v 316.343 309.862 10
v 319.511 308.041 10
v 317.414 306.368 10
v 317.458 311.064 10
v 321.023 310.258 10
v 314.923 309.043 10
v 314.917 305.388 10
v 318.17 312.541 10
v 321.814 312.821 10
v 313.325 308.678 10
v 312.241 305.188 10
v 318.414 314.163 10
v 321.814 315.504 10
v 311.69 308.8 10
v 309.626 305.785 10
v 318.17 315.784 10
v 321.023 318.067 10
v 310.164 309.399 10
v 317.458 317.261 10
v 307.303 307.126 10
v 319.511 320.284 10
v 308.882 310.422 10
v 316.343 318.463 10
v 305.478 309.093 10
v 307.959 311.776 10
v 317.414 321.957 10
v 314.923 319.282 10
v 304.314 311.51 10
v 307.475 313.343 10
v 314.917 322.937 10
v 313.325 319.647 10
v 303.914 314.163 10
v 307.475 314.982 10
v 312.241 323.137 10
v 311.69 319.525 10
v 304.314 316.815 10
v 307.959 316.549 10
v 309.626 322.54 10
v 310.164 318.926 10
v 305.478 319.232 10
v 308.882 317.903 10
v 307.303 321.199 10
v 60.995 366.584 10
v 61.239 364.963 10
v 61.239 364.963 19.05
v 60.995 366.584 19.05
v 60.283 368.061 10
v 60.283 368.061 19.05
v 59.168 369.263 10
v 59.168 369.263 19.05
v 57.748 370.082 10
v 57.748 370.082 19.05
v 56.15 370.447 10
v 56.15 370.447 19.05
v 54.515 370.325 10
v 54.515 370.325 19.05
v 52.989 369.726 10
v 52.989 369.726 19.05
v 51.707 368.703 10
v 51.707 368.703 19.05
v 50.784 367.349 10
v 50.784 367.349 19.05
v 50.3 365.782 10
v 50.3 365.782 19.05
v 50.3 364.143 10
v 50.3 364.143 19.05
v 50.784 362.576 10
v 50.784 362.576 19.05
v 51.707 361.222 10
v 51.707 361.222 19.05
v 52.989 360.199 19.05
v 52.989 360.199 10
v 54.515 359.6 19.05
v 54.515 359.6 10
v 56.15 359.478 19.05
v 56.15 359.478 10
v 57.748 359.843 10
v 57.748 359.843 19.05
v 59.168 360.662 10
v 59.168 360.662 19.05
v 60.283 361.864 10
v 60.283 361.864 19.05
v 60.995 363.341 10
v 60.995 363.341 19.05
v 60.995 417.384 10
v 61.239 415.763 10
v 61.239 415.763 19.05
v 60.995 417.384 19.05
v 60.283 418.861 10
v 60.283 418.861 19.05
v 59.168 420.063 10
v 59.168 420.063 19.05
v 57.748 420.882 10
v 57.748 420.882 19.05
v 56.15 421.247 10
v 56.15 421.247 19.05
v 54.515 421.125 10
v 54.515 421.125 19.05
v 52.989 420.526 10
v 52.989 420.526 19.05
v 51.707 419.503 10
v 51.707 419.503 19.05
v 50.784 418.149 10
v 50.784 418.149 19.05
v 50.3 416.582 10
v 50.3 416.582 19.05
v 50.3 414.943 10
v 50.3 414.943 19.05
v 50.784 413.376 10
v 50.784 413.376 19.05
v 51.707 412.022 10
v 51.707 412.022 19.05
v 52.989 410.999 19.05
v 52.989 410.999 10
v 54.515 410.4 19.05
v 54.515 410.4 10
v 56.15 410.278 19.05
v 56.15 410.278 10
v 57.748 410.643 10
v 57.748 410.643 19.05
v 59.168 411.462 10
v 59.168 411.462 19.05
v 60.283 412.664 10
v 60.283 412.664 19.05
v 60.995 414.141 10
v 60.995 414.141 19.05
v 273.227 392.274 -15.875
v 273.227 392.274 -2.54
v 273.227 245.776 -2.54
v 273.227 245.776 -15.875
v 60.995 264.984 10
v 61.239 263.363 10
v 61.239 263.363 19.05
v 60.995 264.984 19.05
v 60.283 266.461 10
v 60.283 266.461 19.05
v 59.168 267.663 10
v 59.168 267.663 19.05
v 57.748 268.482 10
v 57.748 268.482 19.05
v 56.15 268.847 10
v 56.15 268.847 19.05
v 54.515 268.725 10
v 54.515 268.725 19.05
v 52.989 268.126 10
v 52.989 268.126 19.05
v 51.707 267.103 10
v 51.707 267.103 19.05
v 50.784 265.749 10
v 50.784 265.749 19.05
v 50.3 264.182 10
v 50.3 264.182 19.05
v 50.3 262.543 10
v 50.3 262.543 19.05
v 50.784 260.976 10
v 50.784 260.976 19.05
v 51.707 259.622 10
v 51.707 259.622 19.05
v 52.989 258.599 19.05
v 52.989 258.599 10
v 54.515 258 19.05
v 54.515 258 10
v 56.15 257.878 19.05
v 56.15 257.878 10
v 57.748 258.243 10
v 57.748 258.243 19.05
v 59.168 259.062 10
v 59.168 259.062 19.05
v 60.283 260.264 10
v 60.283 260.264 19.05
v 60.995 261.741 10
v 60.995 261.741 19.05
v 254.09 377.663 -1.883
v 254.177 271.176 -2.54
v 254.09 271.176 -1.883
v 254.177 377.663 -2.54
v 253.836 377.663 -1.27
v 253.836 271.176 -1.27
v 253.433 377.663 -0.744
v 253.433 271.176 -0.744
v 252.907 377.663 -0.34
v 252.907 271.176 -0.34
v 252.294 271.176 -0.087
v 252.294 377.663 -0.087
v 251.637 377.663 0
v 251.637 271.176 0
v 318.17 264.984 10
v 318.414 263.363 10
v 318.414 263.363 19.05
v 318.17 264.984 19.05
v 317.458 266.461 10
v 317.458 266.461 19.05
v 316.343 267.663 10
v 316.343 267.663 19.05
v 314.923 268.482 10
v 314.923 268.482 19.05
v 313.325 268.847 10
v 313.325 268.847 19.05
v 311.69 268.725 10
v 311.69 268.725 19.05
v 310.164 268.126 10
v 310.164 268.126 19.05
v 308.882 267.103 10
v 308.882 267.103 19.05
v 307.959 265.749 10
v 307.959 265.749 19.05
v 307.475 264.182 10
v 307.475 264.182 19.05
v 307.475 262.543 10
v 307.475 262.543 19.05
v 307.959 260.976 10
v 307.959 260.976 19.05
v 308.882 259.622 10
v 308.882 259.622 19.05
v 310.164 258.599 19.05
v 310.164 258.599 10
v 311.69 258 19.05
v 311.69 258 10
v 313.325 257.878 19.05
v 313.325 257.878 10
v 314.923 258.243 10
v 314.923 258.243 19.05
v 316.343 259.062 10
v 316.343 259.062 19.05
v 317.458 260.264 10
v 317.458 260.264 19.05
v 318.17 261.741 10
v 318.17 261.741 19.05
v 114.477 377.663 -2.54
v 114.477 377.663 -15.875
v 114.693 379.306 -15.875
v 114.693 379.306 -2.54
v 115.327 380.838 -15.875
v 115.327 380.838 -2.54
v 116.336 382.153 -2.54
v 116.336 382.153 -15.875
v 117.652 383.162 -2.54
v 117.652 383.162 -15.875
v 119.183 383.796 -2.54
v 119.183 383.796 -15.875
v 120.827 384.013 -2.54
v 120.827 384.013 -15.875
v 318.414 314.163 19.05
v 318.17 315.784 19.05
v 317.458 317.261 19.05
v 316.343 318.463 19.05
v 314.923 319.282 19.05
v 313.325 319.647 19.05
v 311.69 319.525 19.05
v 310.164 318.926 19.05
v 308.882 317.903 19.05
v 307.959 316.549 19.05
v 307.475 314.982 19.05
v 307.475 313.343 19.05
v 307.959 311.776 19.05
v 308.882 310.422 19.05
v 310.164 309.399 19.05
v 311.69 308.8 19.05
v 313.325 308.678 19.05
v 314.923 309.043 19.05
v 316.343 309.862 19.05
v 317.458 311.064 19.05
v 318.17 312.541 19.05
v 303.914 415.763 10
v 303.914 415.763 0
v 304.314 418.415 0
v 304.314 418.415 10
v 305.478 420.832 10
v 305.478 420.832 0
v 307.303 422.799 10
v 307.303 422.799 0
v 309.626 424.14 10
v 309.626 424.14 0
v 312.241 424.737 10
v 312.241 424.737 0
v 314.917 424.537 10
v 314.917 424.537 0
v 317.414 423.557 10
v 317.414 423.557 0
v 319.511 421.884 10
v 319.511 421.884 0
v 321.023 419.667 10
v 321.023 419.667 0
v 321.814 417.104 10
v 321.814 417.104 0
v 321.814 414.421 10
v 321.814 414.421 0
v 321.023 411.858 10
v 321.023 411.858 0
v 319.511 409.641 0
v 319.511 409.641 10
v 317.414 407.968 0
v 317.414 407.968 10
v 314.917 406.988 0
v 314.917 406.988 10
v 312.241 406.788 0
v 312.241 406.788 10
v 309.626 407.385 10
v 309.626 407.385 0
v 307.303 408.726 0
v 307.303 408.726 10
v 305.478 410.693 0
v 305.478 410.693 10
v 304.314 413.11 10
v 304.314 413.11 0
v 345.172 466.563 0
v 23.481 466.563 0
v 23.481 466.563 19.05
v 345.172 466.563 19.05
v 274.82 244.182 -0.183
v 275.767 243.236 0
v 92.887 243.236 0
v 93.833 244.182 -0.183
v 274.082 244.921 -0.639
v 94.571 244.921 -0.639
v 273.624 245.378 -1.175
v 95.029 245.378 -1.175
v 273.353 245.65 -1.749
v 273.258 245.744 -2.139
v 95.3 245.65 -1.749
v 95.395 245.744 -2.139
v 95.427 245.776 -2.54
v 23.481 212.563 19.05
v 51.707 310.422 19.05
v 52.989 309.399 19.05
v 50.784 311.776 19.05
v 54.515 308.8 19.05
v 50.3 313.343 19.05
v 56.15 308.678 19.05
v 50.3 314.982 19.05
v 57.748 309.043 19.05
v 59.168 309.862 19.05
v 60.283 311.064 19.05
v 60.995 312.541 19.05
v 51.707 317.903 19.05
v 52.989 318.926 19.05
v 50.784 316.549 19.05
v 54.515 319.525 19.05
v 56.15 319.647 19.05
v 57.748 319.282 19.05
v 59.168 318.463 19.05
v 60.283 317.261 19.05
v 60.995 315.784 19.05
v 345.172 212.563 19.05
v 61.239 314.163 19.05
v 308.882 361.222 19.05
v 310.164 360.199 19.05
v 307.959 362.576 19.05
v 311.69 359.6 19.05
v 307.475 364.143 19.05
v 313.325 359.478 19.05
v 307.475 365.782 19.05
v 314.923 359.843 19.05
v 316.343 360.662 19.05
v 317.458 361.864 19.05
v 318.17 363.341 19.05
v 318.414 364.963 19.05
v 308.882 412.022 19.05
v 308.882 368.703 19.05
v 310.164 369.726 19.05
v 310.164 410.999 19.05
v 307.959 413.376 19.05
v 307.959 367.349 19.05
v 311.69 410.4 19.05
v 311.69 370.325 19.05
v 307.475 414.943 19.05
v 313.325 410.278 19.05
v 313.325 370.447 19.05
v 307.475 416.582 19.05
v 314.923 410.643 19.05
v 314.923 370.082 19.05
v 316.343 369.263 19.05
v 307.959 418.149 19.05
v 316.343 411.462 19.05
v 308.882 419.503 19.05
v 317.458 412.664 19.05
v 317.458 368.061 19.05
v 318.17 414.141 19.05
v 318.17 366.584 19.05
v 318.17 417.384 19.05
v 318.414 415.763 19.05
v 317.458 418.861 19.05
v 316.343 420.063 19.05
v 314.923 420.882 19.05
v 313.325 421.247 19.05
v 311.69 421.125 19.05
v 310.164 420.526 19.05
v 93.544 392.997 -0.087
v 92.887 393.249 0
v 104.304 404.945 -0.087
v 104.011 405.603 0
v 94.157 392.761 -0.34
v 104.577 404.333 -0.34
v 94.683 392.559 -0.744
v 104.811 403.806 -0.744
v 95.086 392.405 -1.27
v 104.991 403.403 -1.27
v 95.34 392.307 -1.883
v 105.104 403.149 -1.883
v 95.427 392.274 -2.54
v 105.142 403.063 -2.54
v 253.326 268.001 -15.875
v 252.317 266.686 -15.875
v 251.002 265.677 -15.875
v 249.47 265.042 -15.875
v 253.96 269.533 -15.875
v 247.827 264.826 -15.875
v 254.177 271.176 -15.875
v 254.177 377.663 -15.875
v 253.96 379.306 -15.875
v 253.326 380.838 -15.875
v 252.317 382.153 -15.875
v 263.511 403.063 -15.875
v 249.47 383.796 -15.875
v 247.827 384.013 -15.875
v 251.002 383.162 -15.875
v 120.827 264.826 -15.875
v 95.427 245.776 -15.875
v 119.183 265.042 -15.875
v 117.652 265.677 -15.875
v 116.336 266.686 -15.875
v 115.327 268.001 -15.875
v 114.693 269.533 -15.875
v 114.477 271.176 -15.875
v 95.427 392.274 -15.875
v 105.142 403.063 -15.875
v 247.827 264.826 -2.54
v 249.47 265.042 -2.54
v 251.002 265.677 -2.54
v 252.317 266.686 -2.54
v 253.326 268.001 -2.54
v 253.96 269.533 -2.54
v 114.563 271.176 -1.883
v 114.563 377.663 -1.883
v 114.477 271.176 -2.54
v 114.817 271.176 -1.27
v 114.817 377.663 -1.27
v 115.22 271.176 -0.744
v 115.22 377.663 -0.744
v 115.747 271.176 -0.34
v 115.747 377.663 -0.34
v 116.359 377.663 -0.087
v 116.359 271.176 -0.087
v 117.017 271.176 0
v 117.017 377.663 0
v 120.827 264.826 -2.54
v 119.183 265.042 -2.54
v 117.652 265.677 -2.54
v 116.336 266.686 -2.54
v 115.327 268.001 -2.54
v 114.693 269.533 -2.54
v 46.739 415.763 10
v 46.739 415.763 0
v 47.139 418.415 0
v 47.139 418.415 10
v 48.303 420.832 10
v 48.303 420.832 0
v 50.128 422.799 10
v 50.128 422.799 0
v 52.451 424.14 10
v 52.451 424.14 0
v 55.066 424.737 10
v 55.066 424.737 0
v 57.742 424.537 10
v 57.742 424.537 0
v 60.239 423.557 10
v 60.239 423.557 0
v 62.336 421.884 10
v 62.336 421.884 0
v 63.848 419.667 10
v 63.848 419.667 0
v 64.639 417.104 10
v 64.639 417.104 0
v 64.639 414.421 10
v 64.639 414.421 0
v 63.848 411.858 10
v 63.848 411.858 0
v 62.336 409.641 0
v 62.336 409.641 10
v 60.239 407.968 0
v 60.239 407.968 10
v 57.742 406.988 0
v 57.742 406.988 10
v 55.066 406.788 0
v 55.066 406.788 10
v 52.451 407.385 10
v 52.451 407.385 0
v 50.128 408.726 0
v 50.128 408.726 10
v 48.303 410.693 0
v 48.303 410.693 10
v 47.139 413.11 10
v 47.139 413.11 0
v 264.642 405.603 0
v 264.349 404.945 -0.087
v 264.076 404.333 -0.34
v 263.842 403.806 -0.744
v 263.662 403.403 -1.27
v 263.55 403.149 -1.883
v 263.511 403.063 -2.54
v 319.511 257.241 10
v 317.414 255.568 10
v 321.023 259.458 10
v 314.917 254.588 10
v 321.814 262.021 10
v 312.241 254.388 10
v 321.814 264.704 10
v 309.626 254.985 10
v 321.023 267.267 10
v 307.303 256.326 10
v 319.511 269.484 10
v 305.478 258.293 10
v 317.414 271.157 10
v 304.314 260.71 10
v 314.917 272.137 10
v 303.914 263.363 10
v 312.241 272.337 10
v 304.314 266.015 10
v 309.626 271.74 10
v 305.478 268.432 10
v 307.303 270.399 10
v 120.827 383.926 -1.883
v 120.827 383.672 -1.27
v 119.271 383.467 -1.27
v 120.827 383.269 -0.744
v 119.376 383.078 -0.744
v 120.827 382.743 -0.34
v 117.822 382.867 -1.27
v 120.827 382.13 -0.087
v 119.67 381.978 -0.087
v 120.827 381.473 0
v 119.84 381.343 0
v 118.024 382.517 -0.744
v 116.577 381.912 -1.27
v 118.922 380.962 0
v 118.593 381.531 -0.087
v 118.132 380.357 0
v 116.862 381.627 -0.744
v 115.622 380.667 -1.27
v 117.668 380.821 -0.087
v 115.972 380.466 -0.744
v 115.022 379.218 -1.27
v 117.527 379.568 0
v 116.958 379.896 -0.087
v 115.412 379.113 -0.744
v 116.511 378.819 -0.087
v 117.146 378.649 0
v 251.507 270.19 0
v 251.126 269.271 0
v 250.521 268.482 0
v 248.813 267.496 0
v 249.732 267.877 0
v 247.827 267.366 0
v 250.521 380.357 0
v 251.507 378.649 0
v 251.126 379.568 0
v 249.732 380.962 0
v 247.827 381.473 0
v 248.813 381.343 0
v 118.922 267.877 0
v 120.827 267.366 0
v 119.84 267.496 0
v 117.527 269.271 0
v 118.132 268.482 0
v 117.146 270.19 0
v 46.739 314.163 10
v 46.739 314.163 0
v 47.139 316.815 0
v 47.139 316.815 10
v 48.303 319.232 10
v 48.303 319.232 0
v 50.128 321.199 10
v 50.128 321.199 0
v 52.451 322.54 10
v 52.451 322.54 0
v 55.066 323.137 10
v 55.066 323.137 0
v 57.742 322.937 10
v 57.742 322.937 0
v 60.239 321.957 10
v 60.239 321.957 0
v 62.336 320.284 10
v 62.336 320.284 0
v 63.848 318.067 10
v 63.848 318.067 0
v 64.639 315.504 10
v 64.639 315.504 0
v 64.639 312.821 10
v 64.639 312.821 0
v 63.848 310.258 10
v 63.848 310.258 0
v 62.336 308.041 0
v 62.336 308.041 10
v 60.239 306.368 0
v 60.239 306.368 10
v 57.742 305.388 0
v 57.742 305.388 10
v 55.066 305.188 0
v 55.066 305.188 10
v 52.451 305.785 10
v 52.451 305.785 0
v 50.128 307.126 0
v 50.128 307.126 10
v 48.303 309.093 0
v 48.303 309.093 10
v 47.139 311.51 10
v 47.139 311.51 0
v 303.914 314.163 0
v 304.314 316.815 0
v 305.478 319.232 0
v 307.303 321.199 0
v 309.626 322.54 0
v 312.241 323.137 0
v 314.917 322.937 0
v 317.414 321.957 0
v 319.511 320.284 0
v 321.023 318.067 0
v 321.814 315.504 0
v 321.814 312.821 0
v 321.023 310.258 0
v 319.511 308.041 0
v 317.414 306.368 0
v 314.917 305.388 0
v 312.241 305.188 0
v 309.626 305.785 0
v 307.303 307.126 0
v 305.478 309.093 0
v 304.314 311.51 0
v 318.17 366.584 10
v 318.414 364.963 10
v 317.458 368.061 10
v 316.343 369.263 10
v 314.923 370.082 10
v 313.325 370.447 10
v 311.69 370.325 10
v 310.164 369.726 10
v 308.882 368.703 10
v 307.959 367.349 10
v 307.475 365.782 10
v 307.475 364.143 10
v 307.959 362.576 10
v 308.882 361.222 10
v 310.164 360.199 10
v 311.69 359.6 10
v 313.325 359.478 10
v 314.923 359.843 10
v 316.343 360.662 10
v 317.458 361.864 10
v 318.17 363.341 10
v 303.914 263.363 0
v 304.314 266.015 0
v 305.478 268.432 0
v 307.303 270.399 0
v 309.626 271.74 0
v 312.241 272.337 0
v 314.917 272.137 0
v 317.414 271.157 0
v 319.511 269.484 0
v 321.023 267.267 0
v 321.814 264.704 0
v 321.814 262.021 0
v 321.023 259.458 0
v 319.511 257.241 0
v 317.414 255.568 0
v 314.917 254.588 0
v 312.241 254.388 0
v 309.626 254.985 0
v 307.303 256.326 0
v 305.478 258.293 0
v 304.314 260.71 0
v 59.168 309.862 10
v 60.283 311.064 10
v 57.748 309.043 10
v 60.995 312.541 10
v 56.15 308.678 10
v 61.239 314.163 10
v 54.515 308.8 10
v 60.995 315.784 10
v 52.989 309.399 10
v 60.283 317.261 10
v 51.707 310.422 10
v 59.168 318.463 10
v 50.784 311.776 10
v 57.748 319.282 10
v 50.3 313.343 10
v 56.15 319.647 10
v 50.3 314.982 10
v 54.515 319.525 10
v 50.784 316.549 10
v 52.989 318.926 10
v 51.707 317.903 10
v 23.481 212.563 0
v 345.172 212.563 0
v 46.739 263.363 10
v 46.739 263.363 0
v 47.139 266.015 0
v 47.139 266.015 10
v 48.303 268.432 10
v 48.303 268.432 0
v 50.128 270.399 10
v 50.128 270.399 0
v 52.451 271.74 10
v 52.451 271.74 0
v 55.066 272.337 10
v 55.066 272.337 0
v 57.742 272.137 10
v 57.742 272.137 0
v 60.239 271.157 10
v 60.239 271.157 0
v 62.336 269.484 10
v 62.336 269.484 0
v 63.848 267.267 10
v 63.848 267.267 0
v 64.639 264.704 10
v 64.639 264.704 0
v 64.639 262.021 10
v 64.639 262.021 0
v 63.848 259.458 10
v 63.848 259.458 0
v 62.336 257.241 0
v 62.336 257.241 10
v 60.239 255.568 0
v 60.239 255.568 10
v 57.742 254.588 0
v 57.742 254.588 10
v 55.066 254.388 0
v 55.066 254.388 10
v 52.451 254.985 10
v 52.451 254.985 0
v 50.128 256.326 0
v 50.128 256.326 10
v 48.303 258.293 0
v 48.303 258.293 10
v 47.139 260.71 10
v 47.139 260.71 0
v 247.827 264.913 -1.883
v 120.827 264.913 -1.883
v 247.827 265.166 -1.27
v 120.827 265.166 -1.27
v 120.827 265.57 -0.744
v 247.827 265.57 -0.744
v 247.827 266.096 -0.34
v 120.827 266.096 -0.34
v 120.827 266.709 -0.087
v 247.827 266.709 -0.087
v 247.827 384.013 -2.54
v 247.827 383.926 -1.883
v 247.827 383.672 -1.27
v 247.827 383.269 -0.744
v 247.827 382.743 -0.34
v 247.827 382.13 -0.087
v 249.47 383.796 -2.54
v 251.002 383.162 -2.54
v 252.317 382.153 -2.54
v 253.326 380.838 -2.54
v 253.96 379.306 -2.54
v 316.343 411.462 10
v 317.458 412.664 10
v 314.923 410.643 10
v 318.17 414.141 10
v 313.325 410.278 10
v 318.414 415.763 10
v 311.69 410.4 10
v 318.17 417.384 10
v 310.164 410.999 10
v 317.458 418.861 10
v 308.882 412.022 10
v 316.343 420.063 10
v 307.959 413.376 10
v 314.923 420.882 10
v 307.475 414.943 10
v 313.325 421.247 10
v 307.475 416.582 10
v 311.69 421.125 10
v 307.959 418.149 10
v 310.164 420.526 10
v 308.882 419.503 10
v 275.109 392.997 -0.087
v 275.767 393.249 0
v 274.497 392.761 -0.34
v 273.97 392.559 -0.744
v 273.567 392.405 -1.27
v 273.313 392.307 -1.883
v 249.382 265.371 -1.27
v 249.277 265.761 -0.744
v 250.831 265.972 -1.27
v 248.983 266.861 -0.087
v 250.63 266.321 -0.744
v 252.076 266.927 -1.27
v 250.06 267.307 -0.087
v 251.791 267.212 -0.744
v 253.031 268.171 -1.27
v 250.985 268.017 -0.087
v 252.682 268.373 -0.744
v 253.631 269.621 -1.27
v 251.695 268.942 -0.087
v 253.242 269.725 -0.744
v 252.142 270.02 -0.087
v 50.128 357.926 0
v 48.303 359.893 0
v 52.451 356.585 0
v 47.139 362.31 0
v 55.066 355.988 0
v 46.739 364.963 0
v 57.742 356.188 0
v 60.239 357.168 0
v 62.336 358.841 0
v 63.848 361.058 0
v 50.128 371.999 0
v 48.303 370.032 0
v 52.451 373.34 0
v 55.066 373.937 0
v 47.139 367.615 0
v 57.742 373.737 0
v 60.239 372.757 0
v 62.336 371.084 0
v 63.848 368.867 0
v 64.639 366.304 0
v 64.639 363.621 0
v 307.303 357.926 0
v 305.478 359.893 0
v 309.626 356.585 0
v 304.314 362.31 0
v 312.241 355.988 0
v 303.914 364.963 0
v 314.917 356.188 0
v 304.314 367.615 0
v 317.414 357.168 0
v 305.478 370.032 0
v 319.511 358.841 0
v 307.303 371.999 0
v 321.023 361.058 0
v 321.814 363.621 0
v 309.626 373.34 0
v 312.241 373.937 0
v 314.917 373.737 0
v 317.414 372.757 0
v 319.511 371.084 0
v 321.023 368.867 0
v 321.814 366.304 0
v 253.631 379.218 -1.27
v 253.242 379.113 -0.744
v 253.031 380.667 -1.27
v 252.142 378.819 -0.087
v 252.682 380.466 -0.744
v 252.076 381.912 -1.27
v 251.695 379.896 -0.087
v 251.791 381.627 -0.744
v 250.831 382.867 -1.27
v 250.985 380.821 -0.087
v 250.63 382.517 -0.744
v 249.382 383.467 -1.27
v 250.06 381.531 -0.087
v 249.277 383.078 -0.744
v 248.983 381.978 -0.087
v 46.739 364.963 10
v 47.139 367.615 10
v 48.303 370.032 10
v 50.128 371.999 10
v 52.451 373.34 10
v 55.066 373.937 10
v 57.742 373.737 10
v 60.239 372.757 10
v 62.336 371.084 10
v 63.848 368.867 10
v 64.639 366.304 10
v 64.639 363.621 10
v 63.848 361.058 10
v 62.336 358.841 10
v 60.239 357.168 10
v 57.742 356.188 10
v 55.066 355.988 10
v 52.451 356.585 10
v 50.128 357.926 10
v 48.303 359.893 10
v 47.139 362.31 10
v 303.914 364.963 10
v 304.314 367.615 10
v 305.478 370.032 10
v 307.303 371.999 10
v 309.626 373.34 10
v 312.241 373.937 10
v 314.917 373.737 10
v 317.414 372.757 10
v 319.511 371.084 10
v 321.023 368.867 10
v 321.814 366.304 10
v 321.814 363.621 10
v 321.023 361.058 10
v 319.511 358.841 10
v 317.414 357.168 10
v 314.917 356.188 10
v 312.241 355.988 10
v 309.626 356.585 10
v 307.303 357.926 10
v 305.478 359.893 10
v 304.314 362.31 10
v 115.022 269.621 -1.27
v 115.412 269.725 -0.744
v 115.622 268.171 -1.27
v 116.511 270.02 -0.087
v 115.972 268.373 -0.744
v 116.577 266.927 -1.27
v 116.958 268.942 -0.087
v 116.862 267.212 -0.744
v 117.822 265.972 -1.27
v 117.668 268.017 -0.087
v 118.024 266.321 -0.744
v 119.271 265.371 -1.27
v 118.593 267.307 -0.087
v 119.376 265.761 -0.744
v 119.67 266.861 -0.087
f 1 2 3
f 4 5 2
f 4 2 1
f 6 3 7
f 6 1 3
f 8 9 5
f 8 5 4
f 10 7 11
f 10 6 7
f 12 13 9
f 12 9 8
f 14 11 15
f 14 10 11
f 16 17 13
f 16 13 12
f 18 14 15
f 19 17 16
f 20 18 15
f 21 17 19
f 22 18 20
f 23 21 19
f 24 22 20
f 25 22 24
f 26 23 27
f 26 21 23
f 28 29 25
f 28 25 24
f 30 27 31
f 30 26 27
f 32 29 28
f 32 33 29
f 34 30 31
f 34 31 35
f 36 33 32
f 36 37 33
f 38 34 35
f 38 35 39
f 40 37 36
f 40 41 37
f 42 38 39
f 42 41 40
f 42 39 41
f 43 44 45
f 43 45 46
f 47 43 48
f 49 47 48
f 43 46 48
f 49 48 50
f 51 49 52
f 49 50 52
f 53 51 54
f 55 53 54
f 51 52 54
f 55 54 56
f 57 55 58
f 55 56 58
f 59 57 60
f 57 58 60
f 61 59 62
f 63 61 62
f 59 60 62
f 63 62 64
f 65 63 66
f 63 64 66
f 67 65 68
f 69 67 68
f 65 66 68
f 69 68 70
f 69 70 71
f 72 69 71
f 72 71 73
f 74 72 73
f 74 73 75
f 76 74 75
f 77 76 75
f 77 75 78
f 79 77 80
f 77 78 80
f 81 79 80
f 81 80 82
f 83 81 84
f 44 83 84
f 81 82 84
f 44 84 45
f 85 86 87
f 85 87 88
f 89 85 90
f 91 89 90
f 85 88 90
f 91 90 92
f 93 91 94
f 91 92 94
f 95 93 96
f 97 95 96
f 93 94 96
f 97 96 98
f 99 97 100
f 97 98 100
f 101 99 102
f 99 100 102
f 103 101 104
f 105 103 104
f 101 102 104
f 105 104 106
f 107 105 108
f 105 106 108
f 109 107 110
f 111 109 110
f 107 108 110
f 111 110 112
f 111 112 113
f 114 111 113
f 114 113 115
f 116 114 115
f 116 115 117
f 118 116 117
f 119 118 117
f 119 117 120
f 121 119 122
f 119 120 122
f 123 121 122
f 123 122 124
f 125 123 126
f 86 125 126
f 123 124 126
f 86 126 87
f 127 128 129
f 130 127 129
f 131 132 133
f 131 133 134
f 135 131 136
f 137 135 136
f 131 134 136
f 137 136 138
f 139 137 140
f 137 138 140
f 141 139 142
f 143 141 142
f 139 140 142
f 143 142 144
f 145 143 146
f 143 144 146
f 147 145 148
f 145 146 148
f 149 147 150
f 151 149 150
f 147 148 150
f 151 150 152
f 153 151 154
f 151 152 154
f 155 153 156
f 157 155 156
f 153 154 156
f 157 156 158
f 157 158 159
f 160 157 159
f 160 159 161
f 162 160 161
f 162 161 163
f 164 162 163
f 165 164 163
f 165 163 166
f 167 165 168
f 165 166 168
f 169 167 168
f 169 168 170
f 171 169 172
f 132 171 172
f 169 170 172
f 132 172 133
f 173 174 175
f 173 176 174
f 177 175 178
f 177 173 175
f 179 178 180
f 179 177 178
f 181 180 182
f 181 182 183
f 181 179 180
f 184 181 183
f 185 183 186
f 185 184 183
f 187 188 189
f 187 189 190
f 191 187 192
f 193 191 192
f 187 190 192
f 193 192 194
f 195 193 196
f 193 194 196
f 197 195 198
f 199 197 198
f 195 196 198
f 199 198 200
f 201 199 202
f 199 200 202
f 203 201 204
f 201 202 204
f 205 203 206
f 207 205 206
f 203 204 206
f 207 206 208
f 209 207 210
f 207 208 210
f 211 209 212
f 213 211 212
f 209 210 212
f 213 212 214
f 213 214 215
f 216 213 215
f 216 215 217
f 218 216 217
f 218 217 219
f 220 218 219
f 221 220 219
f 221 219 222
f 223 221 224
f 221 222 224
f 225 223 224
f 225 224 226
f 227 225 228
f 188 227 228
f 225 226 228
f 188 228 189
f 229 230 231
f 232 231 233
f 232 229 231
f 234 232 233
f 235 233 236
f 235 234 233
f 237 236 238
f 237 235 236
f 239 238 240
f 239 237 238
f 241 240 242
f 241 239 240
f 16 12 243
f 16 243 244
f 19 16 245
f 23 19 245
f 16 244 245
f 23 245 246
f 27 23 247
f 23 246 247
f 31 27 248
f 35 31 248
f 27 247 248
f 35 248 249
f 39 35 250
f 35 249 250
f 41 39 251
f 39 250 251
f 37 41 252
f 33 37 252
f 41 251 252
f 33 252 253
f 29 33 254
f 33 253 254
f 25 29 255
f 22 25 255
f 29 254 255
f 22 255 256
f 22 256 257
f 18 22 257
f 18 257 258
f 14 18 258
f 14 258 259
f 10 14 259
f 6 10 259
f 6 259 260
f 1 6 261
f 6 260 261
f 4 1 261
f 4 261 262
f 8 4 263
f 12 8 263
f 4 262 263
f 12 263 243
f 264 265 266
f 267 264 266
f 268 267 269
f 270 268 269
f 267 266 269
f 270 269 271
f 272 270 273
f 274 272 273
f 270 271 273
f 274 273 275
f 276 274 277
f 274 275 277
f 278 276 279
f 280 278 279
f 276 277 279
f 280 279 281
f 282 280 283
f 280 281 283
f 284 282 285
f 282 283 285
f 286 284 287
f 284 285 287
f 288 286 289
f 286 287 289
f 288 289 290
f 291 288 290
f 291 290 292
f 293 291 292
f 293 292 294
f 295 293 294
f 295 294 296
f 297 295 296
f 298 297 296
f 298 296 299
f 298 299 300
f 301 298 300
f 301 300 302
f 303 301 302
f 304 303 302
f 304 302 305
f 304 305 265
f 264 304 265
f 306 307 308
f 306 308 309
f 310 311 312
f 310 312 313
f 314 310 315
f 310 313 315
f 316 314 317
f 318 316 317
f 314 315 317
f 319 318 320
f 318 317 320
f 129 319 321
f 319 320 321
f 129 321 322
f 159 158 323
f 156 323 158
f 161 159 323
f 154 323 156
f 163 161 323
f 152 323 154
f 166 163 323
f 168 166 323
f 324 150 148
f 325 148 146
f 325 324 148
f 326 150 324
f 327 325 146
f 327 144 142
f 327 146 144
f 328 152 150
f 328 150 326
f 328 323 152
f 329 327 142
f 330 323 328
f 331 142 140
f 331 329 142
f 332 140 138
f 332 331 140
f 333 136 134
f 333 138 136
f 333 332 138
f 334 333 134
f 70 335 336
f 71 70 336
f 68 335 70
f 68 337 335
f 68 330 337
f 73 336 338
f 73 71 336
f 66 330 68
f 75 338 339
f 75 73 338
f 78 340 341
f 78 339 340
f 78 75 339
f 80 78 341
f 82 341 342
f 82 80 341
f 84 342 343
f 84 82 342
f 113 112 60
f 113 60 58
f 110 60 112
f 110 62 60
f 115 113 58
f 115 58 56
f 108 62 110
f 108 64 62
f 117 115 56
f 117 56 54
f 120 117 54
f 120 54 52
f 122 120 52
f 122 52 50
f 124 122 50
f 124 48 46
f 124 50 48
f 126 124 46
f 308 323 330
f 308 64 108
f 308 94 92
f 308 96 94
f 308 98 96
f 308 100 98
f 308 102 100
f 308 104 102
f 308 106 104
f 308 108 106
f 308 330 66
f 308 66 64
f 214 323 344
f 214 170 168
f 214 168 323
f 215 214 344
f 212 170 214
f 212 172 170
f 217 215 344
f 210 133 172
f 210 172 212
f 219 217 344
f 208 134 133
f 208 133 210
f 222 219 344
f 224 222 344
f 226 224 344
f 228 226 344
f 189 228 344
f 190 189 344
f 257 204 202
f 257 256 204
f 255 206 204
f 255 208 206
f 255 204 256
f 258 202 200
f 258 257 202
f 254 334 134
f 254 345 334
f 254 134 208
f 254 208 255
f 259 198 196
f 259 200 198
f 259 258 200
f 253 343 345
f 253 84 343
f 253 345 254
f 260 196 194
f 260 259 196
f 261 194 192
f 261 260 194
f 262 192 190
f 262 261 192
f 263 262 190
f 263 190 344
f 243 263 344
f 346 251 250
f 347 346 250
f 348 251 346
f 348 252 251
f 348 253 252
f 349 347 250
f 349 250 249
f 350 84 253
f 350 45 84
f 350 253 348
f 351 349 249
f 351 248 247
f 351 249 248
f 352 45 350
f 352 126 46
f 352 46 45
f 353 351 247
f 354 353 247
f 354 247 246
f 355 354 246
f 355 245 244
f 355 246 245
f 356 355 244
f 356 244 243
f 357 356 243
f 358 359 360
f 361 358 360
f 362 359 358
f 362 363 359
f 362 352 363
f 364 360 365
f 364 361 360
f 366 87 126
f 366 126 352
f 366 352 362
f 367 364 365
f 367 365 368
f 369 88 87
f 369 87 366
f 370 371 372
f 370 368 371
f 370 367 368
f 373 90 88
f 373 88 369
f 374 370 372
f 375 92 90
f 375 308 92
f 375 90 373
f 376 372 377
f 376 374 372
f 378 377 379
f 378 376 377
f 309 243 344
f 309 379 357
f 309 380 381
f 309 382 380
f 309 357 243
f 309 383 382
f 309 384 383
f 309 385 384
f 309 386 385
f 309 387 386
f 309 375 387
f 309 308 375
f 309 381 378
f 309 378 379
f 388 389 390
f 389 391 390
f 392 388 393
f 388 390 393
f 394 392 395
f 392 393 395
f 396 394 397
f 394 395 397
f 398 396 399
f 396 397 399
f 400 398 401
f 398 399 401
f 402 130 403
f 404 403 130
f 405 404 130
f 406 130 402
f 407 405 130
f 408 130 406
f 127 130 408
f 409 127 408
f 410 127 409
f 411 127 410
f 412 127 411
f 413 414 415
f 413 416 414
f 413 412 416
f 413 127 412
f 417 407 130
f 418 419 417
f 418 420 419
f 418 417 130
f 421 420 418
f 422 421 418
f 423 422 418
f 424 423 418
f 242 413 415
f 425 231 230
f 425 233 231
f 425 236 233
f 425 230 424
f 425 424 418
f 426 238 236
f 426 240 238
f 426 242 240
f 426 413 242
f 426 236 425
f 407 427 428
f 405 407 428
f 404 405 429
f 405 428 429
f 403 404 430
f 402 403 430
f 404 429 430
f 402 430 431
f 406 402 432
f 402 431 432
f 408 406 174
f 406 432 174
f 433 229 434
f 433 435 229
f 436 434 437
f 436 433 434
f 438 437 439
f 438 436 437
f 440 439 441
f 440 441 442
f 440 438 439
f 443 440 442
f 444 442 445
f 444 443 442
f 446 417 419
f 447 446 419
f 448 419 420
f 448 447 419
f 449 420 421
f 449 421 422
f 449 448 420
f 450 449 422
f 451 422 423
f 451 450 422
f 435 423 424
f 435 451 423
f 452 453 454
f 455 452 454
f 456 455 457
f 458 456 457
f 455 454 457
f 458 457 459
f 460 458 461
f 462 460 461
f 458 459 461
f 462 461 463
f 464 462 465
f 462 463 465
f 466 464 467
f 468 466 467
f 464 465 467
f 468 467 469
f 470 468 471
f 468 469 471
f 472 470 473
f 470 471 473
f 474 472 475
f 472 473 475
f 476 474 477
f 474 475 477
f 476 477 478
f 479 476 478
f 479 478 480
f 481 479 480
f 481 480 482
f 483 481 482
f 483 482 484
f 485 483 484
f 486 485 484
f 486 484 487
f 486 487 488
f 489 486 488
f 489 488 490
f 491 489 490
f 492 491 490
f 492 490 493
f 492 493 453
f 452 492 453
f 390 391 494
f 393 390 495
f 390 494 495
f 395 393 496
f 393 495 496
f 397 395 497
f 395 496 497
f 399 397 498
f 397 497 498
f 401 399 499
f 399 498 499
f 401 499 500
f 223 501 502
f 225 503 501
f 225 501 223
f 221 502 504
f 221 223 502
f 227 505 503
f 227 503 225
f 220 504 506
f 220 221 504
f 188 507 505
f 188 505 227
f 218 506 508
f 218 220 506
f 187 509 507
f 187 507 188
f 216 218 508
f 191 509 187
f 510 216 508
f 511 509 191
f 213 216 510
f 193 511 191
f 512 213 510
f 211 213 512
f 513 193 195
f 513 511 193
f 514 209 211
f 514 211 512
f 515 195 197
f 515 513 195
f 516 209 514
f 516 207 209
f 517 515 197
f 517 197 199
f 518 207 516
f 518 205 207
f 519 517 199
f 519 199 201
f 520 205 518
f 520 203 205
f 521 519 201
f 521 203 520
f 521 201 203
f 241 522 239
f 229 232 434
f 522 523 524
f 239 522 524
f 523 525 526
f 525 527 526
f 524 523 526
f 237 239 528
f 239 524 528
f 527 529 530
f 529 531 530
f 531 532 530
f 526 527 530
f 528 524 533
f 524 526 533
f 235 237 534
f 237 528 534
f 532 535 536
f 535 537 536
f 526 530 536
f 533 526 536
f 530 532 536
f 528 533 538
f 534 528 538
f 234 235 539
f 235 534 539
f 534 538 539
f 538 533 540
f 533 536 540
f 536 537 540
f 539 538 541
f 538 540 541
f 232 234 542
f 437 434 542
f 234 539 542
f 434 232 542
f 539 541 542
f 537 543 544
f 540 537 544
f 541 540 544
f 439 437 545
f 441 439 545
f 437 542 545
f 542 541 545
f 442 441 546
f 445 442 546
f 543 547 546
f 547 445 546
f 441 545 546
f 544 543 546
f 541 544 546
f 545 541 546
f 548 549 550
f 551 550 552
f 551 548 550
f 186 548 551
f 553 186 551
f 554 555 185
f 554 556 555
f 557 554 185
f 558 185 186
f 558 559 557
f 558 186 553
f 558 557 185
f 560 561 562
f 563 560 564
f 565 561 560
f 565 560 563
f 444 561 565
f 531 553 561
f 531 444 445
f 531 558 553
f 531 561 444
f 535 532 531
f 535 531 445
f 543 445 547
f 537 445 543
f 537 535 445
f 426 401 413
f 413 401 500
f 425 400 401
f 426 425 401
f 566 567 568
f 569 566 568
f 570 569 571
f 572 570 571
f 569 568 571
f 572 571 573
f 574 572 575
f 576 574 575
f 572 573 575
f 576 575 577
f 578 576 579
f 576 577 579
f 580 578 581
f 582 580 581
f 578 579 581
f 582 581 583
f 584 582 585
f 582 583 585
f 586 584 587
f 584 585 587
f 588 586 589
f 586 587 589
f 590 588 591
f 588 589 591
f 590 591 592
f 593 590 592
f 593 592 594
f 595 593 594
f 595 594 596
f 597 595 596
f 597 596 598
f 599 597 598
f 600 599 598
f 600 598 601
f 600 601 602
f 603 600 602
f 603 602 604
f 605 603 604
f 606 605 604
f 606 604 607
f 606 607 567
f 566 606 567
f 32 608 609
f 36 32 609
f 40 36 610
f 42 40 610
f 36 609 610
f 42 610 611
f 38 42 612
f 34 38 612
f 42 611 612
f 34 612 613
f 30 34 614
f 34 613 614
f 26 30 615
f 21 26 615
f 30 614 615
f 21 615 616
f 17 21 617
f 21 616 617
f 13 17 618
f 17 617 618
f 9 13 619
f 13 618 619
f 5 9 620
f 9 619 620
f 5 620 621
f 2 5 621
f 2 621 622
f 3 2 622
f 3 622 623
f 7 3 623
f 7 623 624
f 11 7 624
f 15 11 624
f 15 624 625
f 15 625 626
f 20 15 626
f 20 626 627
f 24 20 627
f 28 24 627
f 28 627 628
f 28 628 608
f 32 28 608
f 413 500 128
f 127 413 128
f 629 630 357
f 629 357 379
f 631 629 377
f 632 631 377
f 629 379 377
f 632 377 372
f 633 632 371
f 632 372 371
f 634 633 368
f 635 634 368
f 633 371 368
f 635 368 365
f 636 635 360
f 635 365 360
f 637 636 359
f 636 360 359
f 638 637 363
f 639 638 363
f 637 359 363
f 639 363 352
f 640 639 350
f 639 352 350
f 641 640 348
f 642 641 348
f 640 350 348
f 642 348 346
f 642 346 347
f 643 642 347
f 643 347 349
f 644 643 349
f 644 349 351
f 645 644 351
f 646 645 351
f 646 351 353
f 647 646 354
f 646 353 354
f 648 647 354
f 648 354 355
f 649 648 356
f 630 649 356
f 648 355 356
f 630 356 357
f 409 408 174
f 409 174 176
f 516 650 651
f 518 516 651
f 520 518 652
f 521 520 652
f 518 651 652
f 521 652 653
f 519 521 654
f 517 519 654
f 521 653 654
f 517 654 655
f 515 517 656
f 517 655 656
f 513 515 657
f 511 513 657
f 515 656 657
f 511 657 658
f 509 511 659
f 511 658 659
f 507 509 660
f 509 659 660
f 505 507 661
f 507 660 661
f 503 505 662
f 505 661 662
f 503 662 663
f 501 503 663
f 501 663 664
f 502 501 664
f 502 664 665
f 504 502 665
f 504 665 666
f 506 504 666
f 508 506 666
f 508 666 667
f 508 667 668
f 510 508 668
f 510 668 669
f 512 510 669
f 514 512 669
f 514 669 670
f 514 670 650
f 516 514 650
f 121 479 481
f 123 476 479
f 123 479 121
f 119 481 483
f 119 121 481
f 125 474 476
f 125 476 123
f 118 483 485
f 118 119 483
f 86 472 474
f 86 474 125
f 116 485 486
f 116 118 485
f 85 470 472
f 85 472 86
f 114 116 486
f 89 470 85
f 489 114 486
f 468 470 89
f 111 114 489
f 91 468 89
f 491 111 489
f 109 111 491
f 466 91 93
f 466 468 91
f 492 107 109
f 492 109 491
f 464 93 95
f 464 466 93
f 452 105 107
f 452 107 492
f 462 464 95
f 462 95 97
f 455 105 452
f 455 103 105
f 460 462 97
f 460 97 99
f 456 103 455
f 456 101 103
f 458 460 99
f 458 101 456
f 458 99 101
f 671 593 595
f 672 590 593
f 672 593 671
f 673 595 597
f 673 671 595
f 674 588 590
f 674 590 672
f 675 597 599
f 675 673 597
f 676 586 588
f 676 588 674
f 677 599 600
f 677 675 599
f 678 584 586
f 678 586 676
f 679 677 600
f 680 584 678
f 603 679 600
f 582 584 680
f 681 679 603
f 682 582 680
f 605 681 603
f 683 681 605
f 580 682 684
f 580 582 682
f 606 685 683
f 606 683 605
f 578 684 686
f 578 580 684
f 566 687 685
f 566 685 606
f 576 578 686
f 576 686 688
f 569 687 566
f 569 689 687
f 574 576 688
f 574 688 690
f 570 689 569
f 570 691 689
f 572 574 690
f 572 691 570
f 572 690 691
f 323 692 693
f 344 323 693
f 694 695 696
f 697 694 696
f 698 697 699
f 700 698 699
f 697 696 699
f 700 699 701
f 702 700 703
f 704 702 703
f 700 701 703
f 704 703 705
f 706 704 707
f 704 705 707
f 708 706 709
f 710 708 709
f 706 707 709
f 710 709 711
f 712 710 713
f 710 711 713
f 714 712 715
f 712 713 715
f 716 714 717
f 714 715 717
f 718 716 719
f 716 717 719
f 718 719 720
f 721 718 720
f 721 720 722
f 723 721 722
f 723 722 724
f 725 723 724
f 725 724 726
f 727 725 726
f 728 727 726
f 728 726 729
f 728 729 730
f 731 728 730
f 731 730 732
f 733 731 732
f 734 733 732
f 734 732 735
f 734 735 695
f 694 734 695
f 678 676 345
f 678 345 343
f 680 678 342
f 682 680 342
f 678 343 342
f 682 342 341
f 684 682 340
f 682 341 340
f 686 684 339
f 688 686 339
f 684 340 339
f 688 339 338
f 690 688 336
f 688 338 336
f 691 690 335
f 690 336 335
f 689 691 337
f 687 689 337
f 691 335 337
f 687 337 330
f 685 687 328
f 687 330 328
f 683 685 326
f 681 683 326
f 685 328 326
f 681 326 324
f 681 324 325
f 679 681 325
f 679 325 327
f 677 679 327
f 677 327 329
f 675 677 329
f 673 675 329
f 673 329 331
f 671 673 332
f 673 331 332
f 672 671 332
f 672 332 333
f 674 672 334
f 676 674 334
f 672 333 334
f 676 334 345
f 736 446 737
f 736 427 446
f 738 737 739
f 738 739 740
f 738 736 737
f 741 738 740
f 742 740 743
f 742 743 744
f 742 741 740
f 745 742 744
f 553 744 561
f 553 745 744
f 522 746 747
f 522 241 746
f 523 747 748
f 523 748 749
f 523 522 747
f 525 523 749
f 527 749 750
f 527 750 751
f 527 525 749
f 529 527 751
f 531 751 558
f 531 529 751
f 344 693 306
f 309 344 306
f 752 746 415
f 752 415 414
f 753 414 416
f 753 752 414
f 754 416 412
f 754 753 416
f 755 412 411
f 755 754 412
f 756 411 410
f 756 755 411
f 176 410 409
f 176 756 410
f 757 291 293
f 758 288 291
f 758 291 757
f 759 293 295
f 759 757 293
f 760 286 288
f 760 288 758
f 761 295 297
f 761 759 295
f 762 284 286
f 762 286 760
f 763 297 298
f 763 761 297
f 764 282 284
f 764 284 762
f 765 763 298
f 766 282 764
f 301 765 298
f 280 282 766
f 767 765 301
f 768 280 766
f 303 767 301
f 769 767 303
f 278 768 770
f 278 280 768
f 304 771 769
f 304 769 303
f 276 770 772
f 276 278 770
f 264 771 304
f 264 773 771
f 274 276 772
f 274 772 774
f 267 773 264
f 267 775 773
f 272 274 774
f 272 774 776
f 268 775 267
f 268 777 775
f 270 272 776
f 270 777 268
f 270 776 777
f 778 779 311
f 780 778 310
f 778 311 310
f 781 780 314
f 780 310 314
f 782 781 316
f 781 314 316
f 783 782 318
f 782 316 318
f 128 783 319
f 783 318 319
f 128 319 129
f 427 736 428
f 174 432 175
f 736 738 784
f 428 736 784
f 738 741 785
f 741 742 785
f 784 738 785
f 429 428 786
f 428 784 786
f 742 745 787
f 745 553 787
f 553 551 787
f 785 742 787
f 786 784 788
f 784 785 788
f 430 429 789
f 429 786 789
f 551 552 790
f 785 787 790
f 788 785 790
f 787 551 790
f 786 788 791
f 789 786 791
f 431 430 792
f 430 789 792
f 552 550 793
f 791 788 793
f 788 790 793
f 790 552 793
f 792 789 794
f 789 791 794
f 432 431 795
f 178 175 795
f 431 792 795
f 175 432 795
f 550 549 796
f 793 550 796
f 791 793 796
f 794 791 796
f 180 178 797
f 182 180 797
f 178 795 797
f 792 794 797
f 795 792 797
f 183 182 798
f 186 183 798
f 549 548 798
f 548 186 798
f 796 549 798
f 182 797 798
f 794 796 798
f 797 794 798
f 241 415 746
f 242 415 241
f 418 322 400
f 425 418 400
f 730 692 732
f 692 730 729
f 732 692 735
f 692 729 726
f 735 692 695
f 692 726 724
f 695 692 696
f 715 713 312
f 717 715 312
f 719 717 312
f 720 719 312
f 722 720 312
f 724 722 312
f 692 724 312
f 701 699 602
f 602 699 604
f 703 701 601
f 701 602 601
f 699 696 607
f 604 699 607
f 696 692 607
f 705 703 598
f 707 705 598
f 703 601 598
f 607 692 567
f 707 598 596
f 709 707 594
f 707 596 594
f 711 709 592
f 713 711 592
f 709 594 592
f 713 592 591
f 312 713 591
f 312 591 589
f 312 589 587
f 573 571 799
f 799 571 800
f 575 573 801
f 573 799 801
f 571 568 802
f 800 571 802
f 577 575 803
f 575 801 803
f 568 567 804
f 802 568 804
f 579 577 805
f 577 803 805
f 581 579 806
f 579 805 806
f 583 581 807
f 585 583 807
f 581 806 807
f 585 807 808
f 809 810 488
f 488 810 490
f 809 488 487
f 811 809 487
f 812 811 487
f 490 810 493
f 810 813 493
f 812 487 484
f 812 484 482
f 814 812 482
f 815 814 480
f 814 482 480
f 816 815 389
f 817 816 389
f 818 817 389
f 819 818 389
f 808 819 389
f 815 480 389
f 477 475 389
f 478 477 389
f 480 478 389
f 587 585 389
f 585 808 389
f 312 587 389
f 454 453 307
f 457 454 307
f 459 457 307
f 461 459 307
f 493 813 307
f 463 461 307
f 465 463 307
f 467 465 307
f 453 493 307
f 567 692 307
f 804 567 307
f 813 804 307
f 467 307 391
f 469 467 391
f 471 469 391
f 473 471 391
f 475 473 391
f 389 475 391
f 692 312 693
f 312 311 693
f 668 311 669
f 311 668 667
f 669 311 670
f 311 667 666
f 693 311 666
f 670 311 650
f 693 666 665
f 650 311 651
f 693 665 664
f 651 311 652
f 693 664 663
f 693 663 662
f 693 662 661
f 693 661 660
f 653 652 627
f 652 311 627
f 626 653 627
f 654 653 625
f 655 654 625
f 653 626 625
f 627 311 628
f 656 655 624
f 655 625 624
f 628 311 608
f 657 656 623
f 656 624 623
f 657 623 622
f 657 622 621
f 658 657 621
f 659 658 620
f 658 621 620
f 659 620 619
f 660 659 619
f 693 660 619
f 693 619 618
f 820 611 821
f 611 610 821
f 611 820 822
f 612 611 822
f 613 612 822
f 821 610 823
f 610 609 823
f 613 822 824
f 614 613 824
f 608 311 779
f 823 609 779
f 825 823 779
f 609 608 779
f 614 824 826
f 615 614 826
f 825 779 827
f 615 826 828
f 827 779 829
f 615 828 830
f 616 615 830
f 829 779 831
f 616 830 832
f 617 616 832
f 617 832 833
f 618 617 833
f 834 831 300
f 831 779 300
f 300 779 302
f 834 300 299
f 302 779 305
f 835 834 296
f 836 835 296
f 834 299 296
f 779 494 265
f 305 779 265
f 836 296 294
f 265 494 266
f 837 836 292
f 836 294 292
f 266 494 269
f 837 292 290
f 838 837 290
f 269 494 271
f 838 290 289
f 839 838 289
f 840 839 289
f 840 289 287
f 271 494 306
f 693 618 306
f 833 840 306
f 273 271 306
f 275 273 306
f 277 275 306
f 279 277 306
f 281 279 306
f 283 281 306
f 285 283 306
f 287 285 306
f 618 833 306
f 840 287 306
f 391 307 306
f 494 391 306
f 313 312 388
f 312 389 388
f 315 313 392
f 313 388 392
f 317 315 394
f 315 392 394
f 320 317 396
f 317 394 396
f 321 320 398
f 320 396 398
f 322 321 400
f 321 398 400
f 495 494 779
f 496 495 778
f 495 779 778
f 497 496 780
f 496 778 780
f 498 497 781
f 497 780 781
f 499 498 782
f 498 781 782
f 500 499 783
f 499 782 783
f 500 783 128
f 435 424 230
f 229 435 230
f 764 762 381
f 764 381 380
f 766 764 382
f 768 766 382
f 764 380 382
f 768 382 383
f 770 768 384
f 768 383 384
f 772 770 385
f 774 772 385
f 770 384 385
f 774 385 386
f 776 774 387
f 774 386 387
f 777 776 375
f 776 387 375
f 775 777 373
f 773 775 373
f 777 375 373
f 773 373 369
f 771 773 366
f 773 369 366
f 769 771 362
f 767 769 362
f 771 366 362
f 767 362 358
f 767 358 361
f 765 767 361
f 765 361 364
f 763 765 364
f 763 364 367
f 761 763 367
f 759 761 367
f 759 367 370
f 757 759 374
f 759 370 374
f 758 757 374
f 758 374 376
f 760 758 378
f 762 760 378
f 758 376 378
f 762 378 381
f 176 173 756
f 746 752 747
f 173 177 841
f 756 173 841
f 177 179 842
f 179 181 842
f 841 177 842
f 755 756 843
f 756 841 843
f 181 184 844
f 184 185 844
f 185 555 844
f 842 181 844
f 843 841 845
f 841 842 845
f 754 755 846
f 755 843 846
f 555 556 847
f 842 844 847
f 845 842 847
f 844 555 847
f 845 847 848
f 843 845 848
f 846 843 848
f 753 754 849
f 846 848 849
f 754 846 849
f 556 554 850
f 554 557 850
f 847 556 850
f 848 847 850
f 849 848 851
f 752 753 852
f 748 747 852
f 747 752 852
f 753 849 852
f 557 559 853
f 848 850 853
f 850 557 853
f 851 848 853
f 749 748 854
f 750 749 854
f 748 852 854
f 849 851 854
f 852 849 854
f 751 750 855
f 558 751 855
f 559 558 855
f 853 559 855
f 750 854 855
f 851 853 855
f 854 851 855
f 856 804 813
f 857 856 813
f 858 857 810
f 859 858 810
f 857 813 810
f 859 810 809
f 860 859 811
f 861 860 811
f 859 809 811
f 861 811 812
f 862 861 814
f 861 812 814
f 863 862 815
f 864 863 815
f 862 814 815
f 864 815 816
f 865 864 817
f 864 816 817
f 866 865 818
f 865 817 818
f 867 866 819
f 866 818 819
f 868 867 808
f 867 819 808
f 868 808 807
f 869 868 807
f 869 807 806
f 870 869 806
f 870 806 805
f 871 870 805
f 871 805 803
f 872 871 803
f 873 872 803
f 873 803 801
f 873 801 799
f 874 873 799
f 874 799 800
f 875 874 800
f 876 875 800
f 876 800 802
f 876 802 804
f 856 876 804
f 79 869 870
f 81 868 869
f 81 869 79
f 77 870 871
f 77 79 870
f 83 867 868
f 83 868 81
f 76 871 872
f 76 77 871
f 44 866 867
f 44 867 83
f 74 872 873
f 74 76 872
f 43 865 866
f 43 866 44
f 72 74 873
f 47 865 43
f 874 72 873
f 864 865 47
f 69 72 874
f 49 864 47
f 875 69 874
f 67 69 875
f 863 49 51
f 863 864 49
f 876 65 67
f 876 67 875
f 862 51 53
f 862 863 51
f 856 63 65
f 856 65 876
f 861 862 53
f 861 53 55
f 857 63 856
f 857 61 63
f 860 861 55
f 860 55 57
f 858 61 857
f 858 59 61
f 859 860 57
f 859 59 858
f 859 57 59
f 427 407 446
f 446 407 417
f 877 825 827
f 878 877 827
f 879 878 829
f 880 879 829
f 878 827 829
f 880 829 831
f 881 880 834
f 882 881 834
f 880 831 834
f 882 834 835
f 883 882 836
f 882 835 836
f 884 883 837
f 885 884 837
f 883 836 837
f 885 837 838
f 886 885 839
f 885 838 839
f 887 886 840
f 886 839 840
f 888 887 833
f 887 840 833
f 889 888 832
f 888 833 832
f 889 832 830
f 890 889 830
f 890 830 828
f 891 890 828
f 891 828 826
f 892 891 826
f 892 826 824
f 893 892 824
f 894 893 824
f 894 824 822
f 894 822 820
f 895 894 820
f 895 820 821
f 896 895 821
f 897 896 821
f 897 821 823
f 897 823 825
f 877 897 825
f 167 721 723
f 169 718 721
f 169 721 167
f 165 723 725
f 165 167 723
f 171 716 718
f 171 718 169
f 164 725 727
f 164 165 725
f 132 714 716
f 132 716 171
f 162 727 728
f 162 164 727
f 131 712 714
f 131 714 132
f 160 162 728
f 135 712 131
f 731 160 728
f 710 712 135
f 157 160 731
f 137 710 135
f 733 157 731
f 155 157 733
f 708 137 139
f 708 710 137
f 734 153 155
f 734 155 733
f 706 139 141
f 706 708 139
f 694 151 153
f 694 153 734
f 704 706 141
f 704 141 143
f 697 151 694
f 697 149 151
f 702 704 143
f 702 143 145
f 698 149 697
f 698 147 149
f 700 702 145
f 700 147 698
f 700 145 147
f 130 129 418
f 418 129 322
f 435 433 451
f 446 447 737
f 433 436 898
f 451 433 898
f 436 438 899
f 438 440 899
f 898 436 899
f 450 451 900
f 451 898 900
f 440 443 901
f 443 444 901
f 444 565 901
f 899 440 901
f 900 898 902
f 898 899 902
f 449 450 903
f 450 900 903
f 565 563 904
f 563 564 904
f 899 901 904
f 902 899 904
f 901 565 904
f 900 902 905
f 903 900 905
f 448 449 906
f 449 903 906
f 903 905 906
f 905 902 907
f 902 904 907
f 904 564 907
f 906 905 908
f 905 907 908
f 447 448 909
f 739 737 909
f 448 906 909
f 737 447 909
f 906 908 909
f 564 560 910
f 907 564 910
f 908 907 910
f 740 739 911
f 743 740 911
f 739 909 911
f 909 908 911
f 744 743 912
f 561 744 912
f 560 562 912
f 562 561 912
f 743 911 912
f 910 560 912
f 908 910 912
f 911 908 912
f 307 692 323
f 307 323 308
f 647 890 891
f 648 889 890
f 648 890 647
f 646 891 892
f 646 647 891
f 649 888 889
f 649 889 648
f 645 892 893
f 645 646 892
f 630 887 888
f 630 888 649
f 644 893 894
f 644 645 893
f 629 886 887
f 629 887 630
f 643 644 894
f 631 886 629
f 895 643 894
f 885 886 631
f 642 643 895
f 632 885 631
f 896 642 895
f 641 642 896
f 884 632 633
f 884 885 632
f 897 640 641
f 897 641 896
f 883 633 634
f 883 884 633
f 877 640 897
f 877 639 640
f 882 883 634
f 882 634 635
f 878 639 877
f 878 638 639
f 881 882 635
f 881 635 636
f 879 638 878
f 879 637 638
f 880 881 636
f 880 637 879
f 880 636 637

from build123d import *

# Parameters (mm, degrees)
SKETCH1_W                       = 321.691
SKETCH1_H                       = 254
BASE_EXTRUDE_DEPTH              = 19.05
BOSS_EXTRUDE1_DEPTH             = 15.875
SKETCH3_W                       = 139.7
SKETCH3_H                       = 119.186428927
CUT_EXTRUDE1_DEPTH              = 15.875
FILLET3_R                       = 2.54
FILLET5_R                       = 6.35
FILLET6_R                       = 2.54
CBORE_FOR_M10_SHCS1_D           = 11
CBORE_FOR_M10_SHCS1_CBORE_D     = 18
CBORE_FOR_M10_SHCS1_CBORE_DEPTH = 10
LPATTERN1_COUNT                 = 4
LPATTERN1_PITCH                 = 50.8
CBORE_FOR_M10_SHCS2_D           = 11
CBORE_FOR_M10_SHCS2_CBORE_D     = 18
CBORE_FOR_M10_SHCS2_CBORE_DEPTH = 10
LPATTERN2_COUNT                 = 4
LPATTERN2_PITCH                 = 50.8


with BuildPart() as part:
    # Sketch1 → Base-Extrude (new body)
    with BuildSketch(Plane.XY):
        with Locations((184.326529799, 339.562514452)):
            Rectangle(SKETCH1_W, SKETCH1_H)
    extrude(amount=BASE_EXTRUDE_DEPTH)

    # Sketch2 → Boss-Extrude1 (add)
    with BuildSketch(Plane(origin=(0, 0, 0), x_dir=(-1, 0, 0), z_dir=(0, 0, -1))):
        Polygon((-273.226529799, 392.273888287), (-273.226529799, 245.776085525), (-95.426529799, 245.776085525), (-95.426529799, 392.273888287), (-105.142059927, 403.062514452), (-263.51099967, 403.062514452), align=None)
    extrude(amount=BOSS_EXTRUDE1_DEPTH)

    # Sketch3 → Cut-Extrude1 (cut)
    with BuildSketch(Plane(origin=(0, 0, -15.875), x_dir=(-1, 0, 0), z_dir=(0, 0, -1))):
        with Locations((-184.326529799, 324.419299989)):
            Rectangle(SKETCH3_W, SKETCH3_H)
    extrude(amount=-CUT_EXTRUDE1_DEPTH, mode=Mode.SUBTRACT)

    # Fillet3
    fillet3_edges = [part.edges().sort_by_distance(p)[0] for p in [
        (95.426529799, 319.024986906, 0),
        (100.284294863, 397.668201369, 0),
        (184.326529799, 403.062514452, 0),
        (268.368764734, 397.668201369, 0),
        (273.226529799, 319.024986906, 0),
        (184.326529799, 245.776085525, 0),
    ]]
    fillet(fillet3_edges, radius=FILLET3_R)

    # Fillet5
    fillet5_edges = [part.edges().sort_by_distance(p)[0] for p in [
        (254.176529799, 264.826085525, -7.9375),
        (114.476529799, 264.826085525, -7.9375),
        (114.476529799, 384.012514452, -7.9375),
        (254.176529799, 384.012514452, -7.9375),
    ]]
    fillet(fillet5_edges, radius=FILLET5_R)

    # Fillet6
    fillet6_edges = [part.edges().sort_by_distance(p)[0] for p in [
        (254.176529799, 324.419299989, 0),
        (184.326529799, 384.012514452, 0),
        (184.326529799, 264.826085525, 0),
        (114.476529799, 324.419299989, 0),
        (116.336401738, 266.685957465, 0),
        (116.336401738, 382.152642512, 0),
        (252.316657859, 266.685957465, 0),
        (252.316657859, 382.152642512, 0),
    ]]
    fillet(fillet6_edges, radius=FILLET6_R)

    # CBORE for M10 SHCS1 (through all)
    with Locations(Plane(origin=(0, 0, 0), x_dir=(-1, 0, 0), z_dir=(0, 0, -1))):
        with Locations((-312.914029799, 415.762514452)):
            cbore_for_m10_shcs1 = CounterBoreHole(CBORE_FOR_M10_SHCS1_D / 2, CBORE_FOR_M10_SHCS1_CBORE_D / 2, CBORE_FOR_M10_SHCS1_CBORE_DEPTH)

    # LPattern1: CBORE for M10 SHCS1 ×4
    with Locations(*[(0, -i * LPATTERN1_PITCH, 0) for i in range(1, LPATTERN1_COUNT)]):
        add(cbore_for_m10_shcs1, mode=Mode.SUBTRACT)

    # CBORE for M10 SHCS2 (through all)
    with Locations(Plane(origin=(0, 0, 0), x_dir=(-1, 0, 0), z_dir=(0, 0, -1))):
        with Locations((-55.739029799, 415.762514452)):
            cbore_for_m10_shcs2 = CounterBoreHole(CBORE_FOR_M10_SHCS2_D / 2, CBORE_FOR_M10_SHCS2_CBORE_D / 2, CBORE_FOR_M10_SHCS2_CBORE_DEPTH)

    # LPattern2: CBORE for M10 SHCS2 ×4
    with Locations(*[(0, -i * LPATTERN2_PITCH, 0) for i in range(1, LPATTERN2_COUNT)]):
        add(cbore_for_m10_shcs2, mode=Mode.SUBTRACT)


solid = part.part
